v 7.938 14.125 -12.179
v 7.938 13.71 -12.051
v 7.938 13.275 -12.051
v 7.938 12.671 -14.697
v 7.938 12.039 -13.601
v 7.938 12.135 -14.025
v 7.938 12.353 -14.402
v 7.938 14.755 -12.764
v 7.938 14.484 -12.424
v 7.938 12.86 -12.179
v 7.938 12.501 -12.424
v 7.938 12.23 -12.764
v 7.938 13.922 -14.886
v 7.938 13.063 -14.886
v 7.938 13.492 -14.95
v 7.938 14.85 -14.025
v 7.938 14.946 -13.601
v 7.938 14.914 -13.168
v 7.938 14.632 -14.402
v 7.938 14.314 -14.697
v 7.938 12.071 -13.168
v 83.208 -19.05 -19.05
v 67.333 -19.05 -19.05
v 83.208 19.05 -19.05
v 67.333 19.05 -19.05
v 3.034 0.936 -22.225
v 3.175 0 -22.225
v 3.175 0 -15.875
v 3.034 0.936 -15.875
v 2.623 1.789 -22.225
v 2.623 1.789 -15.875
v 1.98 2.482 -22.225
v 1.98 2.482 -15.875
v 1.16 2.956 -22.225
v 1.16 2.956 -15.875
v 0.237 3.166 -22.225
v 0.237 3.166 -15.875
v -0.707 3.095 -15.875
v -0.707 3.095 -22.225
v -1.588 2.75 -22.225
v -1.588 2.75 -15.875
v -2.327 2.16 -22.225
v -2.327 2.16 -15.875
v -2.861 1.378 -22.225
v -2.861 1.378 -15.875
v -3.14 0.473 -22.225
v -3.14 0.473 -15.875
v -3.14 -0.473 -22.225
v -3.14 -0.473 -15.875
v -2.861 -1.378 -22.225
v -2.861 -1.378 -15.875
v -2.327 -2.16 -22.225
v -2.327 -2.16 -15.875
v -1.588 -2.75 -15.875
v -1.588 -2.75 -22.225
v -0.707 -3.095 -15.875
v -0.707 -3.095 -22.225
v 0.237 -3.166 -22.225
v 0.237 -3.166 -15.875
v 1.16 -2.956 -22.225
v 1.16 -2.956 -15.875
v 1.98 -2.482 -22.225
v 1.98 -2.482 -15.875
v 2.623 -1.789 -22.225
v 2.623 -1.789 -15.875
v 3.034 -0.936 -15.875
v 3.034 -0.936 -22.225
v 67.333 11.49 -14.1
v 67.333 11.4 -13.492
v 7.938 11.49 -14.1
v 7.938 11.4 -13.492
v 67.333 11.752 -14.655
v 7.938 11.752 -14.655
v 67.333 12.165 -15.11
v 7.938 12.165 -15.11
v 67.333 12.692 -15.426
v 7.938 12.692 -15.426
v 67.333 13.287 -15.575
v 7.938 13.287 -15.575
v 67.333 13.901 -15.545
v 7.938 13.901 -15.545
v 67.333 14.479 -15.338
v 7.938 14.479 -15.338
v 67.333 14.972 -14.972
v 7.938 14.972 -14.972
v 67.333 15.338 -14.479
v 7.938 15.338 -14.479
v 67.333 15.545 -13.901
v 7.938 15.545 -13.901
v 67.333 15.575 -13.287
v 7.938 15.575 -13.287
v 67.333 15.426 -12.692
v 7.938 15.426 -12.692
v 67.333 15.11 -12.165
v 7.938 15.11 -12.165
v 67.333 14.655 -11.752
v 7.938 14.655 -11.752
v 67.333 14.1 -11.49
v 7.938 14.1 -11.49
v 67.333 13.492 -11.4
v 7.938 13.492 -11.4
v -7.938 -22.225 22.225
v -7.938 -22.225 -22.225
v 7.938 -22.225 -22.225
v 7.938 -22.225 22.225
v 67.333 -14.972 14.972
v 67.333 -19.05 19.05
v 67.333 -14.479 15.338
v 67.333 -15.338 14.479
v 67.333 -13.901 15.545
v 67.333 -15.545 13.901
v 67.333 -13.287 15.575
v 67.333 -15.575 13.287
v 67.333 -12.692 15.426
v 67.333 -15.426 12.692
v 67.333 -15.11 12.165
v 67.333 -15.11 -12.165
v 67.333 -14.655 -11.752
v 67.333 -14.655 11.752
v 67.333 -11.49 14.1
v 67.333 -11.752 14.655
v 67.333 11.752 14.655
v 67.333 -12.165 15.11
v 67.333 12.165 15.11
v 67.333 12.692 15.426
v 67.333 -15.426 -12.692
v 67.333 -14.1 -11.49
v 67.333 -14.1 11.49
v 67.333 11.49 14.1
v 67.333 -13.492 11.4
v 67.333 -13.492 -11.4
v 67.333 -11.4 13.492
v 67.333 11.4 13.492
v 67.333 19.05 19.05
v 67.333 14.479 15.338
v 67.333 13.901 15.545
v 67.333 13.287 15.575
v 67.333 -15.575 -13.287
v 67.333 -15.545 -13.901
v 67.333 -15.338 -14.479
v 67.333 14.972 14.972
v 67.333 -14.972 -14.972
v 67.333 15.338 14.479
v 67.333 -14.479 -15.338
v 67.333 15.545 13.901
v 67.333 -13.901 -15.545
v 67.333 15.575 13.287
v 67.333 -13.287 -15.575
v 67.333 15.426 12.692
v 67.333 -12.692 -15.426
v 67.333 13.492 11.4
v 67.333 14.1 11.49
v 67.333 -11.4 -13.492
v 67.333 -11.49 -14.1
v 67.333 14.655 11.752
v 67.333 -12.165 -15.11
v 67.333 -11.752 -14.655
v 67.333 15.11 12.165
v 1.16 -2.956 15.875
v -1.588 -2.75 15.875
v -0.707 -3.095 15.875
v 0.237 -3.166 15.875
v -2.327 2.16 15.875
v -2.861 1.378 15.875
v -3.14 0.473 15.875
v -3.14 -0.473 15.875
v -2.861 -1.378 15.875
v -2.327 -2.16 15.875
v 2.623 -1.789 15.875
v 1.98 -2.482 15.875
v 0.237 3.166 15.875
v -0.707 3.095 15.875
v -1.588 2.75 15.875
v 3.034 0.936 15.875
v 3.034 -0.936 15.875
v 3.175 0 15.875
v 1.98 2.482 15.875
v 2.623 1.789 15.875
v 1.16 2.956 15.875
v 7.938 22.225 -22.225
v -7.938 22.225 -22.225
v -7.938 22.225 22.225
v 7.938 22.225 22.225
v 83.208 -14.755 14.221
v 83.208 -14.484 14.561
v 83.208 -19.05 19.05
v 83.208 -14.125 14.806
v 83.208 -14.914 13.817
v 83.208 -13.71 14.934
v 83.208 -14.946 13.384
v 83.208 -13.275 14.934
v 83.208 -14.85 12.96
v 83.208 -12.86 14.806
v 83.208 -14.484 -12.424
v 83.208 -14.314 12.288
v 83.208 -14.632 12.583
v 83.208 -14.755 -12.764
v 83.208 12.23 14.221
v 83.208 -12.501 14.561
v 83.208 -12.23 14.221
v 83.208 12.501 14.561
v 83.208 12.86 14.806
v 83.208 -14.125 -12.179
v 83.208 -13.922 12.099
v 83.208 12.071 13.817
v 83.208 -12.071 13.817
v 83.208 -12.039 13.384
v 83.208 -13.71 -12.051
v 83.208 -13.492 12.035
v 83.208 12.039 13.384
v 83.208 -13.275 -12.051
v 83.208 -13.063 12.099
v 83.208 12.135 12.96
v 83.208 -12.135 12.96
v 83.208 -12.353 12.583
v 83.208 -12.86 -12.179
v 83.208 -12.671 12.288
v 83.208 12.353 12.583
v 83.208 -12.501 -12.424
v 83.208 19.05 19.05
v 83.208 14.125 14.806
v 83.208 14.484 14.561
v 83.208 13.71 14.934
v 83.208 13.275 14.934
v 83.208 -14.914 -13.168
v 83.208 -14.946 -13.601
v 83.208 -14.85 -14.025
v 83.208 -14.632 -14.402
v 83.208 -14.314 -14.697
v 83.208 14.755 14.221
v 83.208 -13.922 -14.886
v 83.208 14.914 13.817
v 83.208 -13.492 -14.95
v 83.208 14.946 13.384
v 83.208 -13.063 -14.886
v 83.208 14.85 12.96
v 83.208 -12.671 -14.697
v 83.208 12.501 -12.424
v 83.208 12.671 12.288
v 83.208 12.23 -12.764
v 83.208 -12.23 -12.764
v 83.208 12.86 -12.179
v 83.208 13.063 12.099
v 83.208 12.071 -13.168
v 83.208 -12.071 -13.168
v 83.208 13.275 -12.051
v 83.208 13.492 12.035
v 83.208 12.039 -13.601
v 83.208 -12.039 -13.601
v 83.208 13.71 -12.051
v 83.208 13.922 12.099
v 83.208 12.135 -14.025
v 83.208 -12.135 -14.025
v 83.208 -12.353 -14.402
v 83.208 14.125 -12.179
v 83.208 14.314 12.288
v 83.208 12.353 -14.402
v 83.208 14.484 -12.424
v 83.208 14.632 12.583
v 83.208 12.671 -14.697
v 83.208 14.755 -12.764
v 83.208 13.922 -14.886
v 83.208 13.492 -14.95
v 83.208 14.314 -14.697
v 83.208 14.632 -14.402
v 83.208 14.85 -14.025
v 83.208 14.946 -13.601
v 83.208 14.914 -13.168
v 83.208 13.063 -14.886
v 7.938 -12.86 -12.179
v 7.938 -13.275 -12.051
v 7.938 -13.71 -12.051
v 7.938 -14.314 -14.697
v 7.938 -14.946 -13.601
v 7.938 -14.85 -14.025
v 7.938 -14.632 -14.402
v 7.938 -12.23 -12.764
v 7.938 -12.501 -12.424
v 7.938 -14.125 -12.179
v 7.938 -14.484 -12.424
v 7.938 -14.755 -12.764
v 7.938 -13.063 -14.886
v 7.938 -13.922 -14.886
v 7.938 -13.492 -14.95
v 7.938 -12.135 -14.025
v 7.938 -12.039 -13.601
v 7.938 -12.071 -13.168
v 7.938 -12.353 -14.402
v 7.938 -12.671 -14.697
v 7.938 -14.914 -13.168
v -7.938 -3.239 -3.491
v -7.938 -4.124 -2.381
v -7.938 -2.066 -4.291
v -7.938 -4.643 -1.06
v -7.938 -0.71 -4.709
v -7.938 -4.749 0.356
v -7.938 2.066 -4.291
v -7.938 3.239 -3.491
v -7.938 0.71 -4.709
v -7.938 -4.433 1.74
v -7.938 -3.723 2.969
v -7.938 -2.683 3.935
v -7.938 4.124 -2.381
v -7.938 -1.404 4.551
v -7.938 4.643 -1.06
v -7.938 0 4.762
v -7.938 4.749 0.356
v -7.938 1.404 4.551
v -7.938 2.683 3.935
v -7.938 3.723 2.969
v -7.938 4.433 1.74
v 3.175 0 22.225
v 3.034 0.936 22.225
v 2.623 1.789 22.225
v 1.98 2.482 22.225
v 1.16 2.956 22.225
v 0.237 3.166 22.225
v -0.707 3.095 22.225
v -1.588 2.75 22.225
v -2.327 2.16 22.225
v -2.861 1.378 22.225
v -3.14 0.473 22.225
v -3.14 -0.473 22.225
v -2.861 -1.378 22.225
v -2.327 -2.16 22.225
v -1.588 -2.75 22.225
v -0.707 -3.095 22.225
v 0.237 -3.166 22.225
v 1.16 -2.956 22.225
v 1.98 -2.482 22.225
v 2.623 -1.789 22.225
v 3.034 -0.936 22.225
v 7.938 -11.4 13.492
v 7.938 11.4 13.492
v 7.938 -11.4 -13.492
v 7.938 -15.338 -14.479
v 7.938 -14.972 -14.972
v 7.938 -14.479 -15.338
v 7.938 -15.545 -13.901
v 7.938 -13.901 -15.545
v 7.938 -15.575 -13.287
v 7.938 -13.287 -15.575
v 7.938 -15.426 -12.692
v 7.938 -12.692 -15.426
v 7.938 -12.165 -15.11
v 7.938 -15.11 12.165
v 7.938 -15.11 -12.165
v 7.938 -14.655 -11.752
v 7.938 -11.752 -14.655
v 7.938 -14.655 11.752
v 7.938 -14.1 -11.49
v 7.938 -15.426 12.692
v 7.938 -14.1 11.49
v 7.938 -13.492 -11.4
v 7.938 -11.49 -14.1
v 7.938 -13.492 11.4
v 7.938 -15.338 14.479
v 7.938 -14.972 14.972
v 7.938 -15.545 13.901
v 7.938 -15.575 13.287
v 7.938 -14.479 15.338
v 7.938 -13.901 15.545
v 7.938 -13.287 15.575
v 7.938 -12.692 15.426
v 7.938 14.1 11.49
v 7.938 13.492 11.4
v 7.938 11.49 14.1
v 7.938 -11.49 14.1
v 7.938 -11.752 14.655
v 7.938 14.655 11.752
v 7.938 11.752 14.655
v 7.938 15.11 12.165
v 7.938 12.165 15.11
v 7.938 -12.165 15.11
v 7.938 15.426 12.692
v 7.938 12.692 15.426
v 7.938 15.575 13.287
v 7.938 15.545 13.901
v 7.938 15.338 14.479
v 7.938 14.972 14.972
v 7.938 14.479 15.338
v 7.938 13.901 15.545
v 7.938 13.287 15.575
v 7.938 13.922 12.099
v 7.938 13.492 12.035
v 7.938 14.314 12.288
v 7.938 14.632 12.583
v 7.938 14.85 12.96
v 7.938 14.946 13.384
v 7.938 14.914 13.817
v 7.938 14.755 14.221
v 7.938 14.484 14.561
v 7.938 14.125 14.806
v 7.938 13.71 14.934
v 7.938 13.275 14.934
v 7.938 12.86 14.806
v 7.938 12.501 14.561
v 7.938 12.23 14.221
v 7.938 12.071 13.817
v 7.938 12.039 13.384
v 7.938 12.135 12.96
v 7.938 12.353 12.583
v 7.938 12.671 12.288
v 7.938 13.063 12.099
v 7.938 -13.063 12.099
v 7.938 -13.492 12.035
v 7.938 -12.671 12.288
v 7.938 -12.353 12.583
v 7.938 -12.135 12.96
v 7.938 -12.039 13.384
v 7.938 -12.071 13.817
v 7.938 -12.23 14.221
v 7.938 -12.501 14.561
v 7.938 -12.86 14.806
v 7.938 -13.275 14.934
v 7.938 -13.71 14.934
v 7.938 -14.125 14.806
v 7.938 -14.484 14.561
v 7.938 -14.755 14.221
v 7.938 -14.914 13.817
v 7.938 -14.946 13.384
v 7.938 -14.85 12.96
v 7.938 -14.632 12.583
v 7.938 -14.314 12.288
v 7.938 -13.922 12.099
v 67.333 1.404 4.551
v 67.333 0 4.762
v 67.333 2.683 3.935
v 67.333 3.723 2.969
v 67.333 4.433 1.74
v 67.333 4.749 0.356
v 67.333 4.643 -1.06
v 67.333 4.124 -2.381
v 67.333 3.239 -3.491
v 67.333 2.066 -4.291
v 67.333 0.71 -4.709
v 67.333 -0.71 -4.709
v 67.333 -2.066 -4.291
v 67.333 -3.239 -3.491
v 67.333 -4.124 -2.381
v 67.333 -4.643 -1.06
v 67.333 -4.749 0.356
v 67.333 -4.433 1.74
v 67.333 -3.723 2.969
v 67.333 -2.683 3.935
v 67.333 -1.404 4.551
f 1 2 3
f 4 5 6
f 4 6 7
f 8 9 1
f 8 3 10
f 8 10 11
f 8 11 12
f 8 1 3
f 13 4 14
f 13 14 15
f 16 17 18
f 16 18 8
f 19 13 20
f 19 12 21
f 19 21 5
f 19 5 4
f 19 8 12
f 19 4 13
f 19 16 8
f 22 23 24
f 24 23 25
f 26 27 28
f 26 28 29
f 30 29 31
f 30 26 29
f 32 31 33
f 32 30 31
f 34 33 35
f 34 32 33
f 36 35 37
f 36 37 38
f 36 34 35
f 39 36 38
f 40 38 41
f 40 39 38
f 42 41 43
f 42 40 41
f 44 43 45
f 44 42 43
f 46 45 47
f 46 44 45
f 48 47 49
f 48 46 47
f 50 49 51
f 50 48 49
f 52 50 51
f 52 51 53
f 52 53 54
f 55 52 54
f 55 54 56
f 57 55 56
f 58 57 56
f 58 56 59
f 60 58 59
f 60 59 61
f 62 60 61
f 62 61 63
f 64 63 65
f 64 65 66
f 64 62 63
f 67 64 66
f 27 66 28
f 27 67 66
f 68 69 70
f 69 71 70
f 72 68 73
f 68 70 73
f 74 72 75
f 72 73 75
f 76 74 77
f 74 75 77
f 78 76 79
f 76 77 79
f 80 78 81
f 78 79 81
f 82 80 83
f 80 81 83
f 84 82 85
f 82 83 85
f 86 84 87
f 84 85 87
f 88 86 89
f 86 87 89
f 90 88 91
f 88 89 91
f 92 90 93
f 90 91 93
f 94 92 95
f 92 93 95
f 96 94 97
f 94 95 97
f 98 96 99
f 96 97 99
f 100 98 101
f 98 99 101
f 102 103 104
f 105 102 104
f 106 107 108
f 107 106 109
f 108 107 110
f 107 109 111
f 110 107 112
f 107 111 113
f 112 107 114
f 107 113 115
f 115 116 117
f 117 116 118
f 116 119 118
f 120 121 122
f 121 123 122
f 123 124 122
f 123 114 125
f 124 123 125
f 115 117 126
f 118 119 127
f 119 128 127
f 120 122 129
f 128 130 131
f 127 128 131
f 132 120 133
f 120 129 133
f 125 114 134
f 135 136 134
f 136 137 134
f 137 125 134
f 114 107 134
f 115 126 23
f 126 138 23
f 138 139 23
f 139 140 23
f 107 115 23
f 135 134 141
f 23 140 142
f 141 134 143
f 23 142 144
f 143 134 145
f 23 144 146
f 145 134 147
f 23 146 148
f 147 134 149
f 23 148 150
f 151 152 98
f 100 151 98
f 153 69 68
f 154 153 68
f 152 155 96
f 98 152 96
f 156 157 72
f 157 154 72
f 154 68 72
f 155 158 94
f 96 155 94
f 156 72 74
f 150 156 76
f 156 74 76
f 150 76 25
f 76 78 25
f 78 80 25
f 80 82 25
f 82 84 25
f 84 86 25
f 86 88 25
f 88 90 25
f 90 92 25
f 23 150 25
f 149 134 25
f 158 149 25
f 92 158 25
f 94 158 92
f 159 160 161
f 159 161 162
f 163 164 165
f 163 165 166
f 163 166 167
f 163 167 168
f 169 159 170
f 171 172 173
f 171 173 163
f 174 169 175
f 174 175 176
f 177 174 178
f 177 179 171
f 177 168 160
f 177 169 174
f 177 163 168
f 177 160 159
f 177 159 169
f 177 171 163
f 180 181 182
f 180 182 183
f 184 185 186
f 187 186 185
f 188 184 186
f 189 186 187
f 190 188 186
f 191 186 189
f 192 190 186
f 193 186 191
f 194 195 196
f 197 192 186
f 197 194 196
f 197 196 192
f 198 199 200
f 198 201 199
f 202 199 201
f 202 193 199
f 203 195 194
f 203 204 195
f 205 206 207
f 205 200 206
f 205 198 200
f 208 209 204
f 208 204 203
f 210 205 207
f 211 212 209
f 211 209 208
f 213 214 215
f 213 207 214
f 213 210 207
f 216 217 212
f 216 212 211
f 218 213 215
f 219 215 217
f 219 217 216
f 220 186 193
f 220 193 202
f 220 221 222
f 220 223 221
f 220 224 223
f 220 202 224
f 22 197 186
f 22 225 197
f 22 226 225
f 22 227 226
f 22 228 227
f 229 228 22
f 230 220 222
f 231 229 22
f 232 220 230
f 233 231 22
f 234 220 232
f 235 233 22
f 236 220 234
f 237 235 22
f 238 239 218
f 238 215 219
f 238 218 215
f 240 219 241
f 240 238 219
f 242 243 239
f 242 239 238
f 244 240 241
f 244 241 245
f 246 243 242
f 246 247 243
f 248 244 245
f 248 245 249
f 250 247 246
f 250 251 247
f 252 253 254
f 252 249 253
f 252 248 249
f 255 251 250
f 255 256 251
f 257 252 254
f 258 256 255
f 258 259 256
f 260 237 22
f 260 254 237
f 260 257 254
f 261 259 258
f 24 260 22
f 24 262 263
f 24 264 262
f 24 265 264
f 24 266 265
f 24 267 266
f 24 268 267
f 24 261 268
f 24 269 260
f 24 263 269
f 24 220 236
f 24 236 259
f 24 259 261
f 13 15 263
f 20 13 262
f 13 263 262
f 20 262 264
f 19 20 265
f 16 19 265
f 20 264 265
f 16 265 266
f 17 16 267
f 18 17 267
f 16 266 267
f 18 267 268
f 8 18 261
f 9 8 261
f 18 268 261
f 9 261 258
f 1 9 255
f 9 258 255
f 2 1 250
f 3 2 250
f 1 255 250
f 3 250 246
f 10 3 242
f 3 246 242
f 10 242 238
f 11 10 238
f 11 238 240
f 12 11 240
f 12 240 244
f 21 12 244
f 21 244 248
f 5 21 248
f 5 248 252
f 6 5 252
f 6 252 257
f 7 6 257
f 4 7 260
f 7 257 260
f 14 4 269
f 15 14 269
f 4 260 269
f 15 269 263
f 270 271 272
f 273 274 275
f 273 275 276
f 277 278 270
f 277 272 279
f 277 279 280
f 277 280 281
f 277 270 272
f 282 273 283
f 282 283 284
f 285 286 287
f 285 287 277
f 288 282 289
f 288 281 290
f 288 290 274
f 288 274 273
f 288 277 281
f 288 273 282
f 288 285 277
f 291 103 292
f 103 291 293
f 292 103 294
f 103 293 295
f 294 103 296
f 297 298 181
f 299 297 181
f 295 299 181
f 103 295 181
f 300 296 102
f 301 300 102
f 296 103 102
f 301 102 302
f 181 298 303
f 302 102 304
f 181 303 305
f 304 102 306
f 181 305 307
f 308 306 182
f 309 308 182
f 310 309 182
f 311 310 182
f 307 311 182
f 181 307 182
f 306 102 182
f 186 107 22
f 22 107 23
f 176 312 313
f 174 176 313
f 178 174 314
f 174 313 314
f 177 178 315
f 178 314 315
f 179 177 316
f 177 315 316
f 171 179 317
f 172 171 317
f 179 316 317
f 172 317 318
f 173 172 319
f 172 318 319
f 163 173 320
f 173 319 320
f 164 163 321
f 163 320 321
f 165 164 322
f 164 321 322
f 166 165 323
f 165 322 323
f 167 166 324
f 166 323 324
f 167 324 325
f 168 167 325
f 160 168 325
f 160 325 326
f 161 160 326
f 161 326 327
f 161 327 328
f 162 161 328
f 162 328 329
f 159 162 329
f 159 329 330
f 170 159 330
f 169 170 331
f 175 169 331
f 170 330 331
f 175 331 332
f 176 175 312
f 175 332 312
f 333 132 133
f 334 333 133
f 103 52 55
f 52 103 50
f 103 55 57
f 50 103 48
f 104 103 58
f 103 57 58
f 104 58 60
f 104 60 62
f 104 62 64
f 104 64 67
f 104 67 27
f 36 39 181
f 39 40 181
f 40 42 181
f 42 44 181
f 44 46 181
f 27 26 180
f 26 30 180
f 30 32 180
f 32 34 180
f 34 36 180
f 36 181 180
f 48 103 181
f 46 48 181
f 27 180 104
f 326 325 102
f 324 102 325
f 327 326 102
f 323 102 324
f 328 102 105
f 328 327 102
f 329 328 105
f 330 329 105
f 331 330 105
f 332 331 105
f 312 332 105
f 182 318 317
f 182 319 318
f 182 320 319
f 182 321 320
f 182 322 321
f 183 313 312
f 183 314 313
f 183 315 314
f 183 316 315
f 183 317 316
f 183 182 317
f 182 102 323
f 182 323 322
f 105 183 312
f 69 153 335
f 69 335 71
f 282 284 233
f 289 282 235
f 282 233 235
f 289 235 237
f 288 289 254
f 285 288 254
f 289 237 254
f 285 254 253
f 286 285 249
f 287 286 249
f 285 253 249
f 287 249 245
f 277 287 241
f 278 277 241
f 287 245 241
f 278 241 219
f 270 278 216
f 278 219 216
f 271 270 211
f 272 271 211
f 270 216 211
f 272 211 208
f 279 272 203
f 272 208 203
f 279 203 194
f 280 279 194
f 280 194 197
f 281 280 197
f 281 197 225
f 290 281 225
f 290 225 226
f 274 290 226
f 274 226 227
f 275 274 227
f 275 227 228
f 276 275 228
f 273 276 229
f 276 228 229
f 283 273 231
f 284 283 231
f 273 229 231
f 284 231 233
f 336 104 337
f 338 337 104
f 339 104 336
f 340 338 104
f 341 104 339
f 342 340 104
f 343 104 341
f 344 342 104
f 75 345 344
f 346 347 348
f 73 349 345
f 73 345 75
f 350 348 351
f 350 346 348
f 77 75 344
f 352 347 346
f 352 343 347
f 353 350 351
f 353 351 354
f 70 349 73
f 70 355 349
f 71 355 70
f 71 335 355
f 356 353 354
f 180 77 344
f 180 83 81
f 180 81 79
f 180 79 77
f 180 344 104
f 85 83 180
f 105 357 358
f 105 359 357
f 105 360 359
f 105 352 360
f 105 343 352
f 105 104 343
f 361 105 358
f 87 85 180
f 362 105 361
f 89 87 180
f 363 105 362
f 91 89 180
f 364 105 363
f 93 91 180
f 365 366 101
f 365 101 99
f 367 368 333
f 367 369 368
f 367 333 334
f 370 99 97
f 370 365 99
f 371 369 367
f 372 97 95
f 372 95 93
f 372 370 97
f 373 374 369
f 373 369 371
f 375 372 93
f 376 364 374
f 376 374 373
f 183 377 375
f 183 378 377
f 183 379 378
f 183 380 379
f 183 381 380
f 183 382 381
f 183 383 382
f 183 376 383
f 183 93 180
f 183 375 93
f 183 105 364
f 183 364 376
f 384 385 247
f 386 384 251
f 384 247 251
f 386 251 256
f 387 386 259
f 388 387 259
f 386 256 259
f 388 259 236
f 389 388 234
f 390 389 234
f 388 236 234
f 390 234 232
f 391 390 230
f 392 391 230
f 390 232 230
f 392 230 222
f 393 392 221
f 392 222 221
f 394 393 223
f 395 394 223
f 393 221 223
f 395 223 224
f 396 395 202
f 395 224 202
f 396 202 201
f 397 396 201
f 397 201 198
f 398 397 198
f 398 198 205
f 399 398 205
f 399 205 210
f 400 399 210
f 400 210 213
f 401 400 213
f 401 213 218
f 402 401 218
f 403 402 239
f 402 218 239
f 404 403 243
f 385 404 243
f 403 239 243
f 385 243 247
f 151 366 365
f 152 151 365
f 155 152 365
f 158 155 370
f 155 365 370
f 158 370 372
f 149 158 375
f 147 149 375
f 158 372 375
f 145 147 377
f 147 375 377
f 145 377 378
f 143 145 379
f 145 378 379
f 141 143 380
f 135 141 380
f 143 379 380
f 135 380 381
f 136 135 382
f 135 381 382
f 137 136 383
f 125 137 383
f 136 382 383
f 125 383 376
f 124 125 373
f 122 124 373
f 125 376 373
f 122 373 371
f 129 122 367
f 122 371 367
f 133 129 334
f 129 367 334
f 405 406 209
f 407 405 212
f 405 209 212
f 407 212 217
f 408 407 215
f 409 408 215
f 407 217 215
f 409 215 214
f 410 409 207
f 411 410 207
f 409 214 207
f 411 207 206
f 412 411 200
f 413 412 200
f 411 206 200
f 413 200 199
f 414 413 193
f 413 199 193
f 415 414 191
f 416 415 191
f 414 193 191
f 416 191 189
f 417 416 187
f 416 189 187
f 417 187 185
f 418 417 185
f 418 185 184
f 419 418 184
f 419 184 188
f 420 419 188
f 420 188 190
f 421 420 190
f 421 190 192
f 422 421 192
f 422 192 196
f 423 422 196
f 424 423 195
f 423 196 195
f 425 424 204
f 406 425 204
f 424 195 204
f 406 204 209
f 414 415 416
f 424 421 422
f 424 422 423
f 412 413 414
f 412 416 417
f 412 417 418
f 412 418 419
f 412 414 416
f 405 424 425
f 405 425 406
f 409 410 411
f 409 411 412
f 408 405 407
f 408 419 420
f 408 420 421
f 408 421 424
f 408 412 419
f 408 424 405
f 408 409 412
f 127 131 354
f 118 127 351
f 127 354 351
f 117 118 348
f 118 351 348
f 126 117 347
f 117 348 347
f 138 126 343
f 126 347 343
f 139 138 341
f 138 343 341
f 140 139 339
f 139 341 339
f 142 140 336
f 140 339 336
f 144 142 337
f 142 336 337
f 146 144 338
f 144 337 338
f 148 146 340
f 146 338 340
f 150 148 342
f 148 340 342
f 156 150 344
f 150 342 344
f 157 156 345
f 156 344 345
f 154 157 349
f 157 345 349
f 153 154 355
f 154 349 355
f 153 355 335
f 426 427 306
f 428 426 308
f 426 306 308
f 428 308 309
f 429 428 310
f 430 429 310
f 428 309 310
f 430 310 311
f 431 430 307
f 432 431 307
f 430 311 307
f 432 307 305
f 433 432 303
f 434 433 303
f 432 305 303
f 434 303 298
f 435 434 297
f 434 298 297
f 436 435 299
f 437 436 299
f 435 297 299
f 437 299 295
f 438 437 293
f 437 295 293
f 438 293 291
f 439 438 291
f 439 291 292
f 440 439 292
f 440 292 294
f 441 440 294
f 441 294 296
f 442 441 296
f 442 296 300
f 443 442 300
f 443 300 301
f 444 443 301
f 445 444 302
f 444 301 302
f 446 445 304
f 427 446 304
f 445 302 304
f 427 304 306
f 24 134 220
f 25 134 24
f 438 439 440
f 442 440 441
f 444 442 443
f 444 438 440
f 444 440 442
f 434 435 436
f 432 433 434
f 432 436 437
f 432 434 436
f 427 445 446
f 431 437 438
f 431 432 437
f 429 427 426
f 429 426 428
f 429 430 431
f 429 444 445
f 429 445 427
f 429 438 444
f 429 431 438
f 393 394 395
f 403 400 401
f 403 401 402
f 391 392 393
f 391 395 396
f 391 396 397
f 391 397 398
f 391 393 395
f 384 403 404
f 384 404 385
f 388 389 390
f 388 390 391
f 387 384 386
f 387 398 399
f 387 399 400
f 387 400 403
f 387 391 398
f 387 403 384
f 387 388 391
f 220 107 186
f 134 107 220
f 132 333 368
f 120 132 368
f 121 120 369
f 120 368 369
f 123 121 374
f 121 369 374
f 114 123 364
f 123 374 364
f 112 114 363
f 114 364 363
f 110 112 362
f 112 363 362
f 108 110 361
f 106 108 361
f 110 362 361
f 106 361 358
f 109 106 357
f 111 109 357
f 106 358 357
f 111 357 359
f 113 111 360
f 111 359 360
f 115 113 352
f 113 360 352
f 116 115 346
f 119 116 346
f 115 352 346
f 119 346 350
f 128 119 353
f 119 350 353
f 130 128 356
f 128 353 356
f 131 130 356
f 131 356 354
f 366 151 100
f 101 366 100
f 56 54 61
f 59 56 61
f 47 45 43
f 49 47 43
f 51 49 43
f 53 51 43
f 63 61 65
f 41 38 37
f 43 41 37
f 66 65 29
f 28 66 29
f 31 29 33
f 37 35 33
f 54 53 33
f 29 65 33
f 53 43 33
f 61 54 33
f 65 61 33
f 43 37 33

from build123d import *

# Parameters (mm, degrees)
SKETCH1_W           = 15.875
SKETCH1_H           = 44.45
BASE_EXTRUDE_DEPTH  = 22.225
SKETCH2_W           = 26.98496
SKETCH2_H           = 26.98496
BOSS_EXTRUDE1_DEPTH = 59.39536
SKETCH3_W           = 38.1
SKETCH3_H           = 38.1
BOSS_EXTRUDE2_DEPTH = 15.875
SKETCH4_R           = 2.09296
BOSS_EXTRUDE3_DEPTH = 59.39536
SKETCH5_R           = 1.45796
CUT_EXTRUDE1_DEPTH  = 75.27036
SKETCH6_R           = 4.7625
CUT_EXTRUDE2_DEPTH  = 75.27036
SKETCH8_R           = 3.175
CUT_EXTRUDE3_DEPTH  = 6.35


with BuildPart() as part:
    # Sketch1 → Base-Extrude (new, symmetric)
    with BuildSketch(Plane.XY):
        Rectangle(SKETCH1_W, SKETCH1_H)
    extrude(amount=BASE_EXTRUDE_DEPTH, both=True)

    # Sketch2 → Boss-Extrude1 (add)
    with BuildSketch(Plane(origin=(7.9375, 0, 0), x_dir=(0, 0, -1), z_dir=(1, 0, 0))):
        Rectangle(SKETCH2_W, SKETCH2_H)
    extrude(amount=BOSS_EXTRUDE1_DEPTH)

    # Sketch3 → Boss-Extrude2 (add)
    with BuildSketch(Plane(origin=(67.33286, -2.916482086, 3.369055623), x_dir=(0, 0, -1), z_dir=(1, 0, 0))):
        with Locations((3.369055623, 2.916482086)):
            Rectangle(SKETCH3_W, SKETCH3_H)
    extrude(amount=BOSS_EXTRUDE2_DEPTH)

    # Sketch4 → Boss-Extrude3 (add)
    with BuildSketch(Plane(origin=(7.9375, 0, 0), x_dir=(0, 0, -1), z_dir=(1, 0, 0))):
        with Locations((-13.49248, 13.49248)):
            Circle(SKETCH4_R)
        with Locations((-13.49248, -13.49248)):
            Circle(SKETCH4_R)
        with Locations((13.49248, 13.49248)):
            Circle(SKETCH4_R)
        with Locations((13.49248, -13.49248)):
            Circle(SKETCH4_R)
    extrude(amount=BOSS_EXTRUDE3_DEPTH)

    # Sketch5 → Cut-Extrude1 (cut)
    with BuildSketch(Plane(origin=(83.20786, 0, 0), x_dir=(0, 0, -1), z_dir=(1, 0, 0))):
        with Locations((-13.49248, 13.49248)):
            Circle(SKETCH5_R)
        with Locations((-13.49248, -13.49248)):
            Circle(SKETCH5_R)
        with Locations((13.49248, 13.49248)):
            Circle(SKETCH5_R)
        with Locations((13.49248, -13.49248)):
            Circle(SKETCH5_R)
    extrude(amount=-CUT_EXTRUDE1_DEPTH, mode=Mode.SUBTRACT)

    # Sketch6 → Cut-Extrude2 (cut)
    with BuildSketch(Plane.ZY.offset(7.9375)):
        Circle(SKETCH6_R)
    extrude(amount=-CUT_EXTRUDE2_DEPTH, mode=Mode.SUBTRACT)

    # Sketch8 → Cut-Extrude3 (cut)
    with BuildSketch(Plane.XY.offset(22.225)):
        Circle(SKETCH8_R)
    cut_extrude3 = extrude(amount=-CUT_EXTRUDE3_DEPTH, mode=Mode.SUBTRACT)

    # Mirror1: Cut-Extrude3 across plane
    add(cut_extrude3.mirror(Plane.XY), mode=Mode.SUBTRACT)


solid = part.part
